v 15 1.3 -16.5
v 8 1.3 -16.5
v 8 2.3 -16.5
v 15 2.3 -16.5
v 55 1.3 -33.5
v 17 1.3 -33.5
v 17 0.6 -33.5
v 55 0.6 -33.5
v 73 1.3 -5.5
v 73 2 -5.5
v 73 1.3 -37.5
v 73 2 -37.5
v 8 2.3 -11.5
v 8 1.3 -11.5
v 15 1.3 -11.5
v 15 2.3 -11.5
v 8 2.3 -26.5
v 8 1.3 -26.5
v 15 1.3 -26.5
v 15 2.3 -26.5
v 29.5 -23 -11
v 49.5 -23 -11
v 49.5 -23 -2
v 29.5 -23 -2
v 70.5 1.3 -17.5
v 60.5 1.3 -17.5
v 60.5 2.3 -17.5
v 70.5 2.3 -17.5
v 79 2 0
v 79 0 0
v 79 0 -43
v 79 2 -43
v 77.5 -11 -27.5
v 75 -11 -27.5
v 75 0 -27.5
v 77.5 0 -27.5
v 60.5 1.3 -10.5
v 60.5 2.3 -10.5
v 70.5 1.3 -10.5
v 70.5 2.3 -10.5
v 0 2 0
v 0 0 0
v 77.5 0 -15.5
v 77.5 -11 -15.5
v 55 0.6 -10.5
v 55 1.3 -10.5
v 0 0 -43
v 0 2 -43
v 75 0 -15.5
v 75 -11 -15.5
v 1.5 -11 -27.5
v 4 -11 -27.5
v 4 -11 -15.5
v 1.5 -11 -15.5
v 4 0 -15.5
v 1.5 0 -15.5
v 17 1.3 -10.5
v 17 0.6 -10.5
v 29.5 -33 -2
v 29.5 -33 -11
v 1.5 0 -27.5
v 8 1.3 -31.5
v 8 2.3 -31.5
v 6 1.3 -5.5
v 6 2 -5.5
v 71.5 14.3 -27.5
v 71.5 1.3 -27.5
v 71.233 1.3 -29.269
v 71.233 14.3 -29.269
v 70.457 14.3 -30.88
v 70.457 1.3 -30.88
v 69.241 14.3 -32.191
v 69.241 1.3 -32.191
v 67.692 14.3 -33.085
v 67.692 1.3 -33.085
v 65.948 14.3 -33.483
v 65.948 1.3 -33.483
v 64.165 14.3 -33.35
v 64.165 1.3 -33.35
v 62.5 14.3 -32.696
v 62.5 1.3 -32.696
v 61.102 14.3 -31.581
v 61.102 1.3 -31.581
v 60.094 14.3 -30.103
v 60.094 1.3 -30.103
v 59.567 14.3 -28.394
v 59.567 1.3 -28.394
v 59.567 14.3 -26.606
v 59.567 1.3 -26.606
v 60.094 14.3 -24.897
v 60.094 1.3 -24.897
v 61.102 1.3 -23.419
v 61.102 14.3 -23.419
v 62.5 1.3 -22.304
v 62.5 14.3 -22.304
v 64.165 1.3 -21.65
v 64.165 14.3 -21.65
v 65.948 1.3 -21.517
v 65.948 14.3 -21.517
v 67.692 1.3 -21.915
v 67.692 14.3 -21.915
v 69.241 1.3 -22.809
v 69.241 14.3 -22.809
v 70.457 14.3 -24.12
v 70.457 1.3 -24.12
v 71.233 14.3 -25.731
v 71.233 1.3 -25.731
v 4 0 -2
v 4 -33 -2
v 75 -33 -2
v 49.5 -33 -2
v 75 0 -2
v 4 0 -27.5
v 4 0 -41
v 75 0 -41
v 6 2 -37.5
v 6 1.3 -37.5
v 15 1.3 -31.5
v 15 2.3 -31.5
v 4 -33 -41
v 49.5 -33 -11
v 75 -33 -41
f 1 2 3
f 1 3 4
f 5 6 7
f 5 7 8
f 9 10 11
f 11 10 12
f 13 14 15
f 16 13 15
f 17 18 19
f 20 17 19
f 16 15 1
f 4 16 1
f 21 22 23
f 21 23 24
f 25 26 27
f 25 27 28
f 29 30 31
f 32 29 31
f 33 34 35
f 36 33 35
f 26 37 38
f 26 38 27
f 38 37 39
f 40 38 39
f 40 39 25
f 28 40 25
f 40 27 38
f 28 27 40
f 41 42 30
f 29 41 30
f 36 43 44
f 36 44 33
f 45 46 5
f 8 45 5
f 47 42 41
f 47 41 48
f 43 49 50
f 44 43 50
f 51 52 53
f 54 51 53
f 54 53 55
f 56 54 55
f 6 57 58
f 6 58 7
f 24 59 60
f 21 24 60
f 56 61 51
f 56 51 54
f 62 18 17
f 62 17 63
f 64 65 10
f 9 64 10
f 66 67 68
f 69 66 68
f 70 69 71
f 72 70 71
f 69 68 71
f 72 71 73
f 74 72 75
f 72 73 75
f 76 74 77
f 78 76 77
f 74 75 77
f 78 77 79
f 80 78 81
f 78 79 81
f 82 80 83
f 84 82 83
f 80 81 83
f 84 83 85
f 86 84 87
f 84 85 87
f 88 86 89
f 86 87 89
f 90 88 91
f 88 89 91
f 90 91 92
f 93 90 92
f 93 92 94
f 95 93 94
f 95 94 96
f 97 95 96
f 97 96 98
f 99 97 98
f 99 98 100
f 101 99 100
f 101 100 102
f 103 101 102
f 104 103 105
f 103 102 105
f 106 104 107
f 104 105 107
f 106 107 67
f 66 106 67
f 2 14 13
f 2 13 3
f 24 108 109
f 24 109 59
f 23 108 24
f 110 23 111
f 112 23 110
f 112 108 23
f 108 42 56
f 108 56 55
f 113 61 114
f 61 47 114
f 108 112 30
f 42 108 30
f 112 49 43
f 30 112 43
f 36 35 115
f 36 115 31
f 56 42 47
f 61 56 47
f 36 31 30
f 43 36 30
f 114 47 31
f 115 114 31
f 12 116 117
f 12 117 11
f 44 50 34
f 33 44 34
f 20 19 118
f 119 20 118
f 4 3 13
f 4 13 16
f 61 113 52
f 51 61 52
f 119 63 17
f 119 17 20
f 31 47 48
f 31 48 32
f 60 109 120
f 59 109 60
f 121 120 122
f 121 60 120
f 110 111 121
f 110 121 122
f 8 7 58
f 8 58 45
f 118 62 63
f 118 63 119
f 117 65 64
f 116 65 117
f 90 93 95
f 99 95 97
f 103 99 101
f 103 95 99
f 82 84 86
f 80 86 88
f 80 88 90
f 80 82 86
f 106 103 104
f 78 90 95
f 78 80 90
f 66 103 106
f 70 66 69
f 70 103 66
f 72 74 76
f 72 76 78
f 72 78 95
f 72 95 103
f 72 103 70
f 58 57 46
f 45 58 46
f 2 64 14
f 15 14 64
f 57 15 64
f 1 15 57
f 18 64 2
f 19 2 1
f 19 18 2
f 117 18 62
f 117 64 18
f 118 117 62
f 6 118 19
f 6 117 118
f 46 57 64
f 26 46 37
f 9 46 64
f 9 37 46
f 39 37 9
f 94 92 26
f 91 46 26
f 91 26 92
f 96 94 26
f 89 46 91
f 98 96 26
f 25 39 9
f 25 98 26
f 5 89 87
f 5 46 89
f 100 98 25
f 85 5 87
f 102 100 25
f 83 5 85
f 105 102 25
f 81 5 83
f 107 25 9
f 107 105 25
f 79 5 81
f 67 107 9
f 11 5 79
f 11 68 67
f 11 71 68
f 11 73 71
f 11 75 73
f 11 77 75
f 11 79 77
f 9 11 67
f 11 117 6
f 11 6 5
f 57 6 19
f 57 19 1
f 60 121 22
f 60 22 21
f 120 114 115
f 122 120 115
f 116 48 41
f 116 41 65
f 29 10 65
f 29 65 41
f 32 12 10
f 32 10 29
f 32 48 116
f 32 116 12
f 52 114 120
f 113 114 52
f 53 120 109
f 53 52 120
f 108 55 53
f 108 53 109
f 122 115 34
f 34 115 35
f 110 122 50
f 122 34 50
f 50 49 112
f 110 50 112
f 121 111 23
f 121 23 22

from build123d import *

# Parameters (mm, degrees)
SKETCH2_W           = 79
SKETCH2_H           = 43
BOSS_EXTRUDE1_DEPTH = 2
SKETCH3_W           = 67
SKETCH3_H           = 32
CUT_EXTRUDE1_DEPTH  = 0.7
SKETCH4_W           = 38
SKETCH4_H           = 23
CUT_EXTRUDE2_DEPTH  = 0.7
SKETCH7_R           = 6
BOSS_EXTRUDE2_DEPTH = 13
SKETCH8_W           = 10
SKETCH8_H           = 7
BOSS_EXTRUDE3_DEPTH = 1
SKETCH9_W           = 7
SKETCH9_H           = 5
BOSS_EXTRUDE4_DEPTH = 1
SKETCH10_W          = 71
SKETCH10_H          = 39
BOSS_EXTRUDE5_DEPTH = 33
SKETCH11_W          = 20
SKETCH11_H          = 18
CUT_EXTRUDE3_DEPTH  = 10
BOSS_EXTRUDE6_DEPTH = 2.5
BOSS_EXTRUDE7_DEPTH = 2.5


with BuildPart() as part:
    # Sketch2 → Boss-Extrude1 (new body)
    with BuildSketch(Plane(origin=(0, 0, 0), x_dir=(1, 0, 0), z_dir=(0, 1, 0))):
        with Locations((39.5, 21.5)):
            Rectangle(SKETCH2_W, SKETCH2_H)
    extrude(amount=BOSS_EXTRUDE1_DEPTH)

    # Sketch3 → Cut-Extrude1 (cut)
    with BuildSketch(Plane(origin=(0, 2, 0), x_dir=(1, 0, 0), z_dir=(0, 1, 0))):
        with Locations((39.5, 21.5)):
            Rectangle(SKETCH3_W, SKETCH3_H)
    extrude(amount=-CUT_EXTRUDE1_DEPTH, mode=Mode.SUBTRACT)

    # Sketch4 → Cut-Extrude2 (cut)
    with BuildSketch(Plane(origin=(0, 1.3, 0), x_dir=(1, 0, 0), z_dir=(0, 1, 0))):
        with Locations((36, 22)):
            Rectangle(SKETCH4_W, SKETCH4_H)
    extrude(amount=-CUT_EXTRUDE2_DEPTH, mode=Mode.SUBTRACT)

    # Sketch7 → Boss-Extrude2 (add)
    with BuildSketch(Plane(origin=(0, 1.3, 0), x_dir=(1, 0, 0), z_dir=(0, 1, 0))):
        with Locations((65.5, 27.5)):
            Circle(SKETCH7_R)
    extrude(amount=BOSS_EXTRUDE2_DEPTH)

    # Sketch8 → Boss-Extrude3 (add)
    with BuildSketch(Plane(origin=(0, 1.3, 0), x_dir=(1, 0, 0), z_dir=(0, 1, 0))):
        with Locations((65.5, 14)):
            Rectangle(SKETCH8_W, SKETCH8_H)
    extrude(amount=BOSS_EXTRUDE3_DEPTH)

    # Sketch9 → Boss-Extrude4 (add)
    with BuildSketch(Plane(origin=(0, 1.3, 0), x_dir=(1, 0, 0), z_dir=(0, 1, 0))):
        with Locations((11.5, 14)):
            Rectangle(SKETCH9_W, SKETCH9_H)
        with Locations((11.5, 29)):
            Rectangle(SKETCH9_W, SKETCH9_H)
    extrude(amount=BOSS_EXTRUDE4_DEPTH)

    # Sketch10 → Boss-Extrude5 (add)
    with BuildSketch(Plane.XZ):
        with Locations((39.5, -21.5)):
            Rectangle(SKETCH10_W, SKETCH10_H)
    extrude(amount=BOSS_EXTRUDE5_DEPTH)

    # Sketch11 → Cut-Extrude3 (cut)
    with BuildSketch(Plane(origin=(0, -33, 0), x_dir=(-1, 0, 0), z_dir=(0, -1, 0))):
        with Locations((-39.5, 2)):
            Rectangle(SKETCH11_W, SKETCH11_H)
    extrude(amount=-CUT_EXTRUDE3_DEPTH, mode=Mode.SUBTRACT)

    # Sketch12 → Boss-Extrude6 (add)
    with BuildSketch(Plane.ZY.offset(-4)):
        Polygon((-21.5, 0), (-27.5, 0), (-27.5, -11), (-21.5, -11), (-15.5, -11), (-15.5, 0), align=None)
    extrude(amount=BOSS_EXTRUDE6_DEPTH)

    # Sketch13 → Boss-Extrude7 (add)
    with BuildSketch(Plane(origin=(75, 0, 0), x_dir=(0, 0, -1), z_dir=(1, 0, 0))):
        Polygon((21.5, 0), (15.5, 0), (15.5, -11), (21.5, -11), (27.5, -11), (27.5, 0), align=None)
    extrude(amount=BOSS_EXTRUDE7_DEPTH)


solid = part.part
